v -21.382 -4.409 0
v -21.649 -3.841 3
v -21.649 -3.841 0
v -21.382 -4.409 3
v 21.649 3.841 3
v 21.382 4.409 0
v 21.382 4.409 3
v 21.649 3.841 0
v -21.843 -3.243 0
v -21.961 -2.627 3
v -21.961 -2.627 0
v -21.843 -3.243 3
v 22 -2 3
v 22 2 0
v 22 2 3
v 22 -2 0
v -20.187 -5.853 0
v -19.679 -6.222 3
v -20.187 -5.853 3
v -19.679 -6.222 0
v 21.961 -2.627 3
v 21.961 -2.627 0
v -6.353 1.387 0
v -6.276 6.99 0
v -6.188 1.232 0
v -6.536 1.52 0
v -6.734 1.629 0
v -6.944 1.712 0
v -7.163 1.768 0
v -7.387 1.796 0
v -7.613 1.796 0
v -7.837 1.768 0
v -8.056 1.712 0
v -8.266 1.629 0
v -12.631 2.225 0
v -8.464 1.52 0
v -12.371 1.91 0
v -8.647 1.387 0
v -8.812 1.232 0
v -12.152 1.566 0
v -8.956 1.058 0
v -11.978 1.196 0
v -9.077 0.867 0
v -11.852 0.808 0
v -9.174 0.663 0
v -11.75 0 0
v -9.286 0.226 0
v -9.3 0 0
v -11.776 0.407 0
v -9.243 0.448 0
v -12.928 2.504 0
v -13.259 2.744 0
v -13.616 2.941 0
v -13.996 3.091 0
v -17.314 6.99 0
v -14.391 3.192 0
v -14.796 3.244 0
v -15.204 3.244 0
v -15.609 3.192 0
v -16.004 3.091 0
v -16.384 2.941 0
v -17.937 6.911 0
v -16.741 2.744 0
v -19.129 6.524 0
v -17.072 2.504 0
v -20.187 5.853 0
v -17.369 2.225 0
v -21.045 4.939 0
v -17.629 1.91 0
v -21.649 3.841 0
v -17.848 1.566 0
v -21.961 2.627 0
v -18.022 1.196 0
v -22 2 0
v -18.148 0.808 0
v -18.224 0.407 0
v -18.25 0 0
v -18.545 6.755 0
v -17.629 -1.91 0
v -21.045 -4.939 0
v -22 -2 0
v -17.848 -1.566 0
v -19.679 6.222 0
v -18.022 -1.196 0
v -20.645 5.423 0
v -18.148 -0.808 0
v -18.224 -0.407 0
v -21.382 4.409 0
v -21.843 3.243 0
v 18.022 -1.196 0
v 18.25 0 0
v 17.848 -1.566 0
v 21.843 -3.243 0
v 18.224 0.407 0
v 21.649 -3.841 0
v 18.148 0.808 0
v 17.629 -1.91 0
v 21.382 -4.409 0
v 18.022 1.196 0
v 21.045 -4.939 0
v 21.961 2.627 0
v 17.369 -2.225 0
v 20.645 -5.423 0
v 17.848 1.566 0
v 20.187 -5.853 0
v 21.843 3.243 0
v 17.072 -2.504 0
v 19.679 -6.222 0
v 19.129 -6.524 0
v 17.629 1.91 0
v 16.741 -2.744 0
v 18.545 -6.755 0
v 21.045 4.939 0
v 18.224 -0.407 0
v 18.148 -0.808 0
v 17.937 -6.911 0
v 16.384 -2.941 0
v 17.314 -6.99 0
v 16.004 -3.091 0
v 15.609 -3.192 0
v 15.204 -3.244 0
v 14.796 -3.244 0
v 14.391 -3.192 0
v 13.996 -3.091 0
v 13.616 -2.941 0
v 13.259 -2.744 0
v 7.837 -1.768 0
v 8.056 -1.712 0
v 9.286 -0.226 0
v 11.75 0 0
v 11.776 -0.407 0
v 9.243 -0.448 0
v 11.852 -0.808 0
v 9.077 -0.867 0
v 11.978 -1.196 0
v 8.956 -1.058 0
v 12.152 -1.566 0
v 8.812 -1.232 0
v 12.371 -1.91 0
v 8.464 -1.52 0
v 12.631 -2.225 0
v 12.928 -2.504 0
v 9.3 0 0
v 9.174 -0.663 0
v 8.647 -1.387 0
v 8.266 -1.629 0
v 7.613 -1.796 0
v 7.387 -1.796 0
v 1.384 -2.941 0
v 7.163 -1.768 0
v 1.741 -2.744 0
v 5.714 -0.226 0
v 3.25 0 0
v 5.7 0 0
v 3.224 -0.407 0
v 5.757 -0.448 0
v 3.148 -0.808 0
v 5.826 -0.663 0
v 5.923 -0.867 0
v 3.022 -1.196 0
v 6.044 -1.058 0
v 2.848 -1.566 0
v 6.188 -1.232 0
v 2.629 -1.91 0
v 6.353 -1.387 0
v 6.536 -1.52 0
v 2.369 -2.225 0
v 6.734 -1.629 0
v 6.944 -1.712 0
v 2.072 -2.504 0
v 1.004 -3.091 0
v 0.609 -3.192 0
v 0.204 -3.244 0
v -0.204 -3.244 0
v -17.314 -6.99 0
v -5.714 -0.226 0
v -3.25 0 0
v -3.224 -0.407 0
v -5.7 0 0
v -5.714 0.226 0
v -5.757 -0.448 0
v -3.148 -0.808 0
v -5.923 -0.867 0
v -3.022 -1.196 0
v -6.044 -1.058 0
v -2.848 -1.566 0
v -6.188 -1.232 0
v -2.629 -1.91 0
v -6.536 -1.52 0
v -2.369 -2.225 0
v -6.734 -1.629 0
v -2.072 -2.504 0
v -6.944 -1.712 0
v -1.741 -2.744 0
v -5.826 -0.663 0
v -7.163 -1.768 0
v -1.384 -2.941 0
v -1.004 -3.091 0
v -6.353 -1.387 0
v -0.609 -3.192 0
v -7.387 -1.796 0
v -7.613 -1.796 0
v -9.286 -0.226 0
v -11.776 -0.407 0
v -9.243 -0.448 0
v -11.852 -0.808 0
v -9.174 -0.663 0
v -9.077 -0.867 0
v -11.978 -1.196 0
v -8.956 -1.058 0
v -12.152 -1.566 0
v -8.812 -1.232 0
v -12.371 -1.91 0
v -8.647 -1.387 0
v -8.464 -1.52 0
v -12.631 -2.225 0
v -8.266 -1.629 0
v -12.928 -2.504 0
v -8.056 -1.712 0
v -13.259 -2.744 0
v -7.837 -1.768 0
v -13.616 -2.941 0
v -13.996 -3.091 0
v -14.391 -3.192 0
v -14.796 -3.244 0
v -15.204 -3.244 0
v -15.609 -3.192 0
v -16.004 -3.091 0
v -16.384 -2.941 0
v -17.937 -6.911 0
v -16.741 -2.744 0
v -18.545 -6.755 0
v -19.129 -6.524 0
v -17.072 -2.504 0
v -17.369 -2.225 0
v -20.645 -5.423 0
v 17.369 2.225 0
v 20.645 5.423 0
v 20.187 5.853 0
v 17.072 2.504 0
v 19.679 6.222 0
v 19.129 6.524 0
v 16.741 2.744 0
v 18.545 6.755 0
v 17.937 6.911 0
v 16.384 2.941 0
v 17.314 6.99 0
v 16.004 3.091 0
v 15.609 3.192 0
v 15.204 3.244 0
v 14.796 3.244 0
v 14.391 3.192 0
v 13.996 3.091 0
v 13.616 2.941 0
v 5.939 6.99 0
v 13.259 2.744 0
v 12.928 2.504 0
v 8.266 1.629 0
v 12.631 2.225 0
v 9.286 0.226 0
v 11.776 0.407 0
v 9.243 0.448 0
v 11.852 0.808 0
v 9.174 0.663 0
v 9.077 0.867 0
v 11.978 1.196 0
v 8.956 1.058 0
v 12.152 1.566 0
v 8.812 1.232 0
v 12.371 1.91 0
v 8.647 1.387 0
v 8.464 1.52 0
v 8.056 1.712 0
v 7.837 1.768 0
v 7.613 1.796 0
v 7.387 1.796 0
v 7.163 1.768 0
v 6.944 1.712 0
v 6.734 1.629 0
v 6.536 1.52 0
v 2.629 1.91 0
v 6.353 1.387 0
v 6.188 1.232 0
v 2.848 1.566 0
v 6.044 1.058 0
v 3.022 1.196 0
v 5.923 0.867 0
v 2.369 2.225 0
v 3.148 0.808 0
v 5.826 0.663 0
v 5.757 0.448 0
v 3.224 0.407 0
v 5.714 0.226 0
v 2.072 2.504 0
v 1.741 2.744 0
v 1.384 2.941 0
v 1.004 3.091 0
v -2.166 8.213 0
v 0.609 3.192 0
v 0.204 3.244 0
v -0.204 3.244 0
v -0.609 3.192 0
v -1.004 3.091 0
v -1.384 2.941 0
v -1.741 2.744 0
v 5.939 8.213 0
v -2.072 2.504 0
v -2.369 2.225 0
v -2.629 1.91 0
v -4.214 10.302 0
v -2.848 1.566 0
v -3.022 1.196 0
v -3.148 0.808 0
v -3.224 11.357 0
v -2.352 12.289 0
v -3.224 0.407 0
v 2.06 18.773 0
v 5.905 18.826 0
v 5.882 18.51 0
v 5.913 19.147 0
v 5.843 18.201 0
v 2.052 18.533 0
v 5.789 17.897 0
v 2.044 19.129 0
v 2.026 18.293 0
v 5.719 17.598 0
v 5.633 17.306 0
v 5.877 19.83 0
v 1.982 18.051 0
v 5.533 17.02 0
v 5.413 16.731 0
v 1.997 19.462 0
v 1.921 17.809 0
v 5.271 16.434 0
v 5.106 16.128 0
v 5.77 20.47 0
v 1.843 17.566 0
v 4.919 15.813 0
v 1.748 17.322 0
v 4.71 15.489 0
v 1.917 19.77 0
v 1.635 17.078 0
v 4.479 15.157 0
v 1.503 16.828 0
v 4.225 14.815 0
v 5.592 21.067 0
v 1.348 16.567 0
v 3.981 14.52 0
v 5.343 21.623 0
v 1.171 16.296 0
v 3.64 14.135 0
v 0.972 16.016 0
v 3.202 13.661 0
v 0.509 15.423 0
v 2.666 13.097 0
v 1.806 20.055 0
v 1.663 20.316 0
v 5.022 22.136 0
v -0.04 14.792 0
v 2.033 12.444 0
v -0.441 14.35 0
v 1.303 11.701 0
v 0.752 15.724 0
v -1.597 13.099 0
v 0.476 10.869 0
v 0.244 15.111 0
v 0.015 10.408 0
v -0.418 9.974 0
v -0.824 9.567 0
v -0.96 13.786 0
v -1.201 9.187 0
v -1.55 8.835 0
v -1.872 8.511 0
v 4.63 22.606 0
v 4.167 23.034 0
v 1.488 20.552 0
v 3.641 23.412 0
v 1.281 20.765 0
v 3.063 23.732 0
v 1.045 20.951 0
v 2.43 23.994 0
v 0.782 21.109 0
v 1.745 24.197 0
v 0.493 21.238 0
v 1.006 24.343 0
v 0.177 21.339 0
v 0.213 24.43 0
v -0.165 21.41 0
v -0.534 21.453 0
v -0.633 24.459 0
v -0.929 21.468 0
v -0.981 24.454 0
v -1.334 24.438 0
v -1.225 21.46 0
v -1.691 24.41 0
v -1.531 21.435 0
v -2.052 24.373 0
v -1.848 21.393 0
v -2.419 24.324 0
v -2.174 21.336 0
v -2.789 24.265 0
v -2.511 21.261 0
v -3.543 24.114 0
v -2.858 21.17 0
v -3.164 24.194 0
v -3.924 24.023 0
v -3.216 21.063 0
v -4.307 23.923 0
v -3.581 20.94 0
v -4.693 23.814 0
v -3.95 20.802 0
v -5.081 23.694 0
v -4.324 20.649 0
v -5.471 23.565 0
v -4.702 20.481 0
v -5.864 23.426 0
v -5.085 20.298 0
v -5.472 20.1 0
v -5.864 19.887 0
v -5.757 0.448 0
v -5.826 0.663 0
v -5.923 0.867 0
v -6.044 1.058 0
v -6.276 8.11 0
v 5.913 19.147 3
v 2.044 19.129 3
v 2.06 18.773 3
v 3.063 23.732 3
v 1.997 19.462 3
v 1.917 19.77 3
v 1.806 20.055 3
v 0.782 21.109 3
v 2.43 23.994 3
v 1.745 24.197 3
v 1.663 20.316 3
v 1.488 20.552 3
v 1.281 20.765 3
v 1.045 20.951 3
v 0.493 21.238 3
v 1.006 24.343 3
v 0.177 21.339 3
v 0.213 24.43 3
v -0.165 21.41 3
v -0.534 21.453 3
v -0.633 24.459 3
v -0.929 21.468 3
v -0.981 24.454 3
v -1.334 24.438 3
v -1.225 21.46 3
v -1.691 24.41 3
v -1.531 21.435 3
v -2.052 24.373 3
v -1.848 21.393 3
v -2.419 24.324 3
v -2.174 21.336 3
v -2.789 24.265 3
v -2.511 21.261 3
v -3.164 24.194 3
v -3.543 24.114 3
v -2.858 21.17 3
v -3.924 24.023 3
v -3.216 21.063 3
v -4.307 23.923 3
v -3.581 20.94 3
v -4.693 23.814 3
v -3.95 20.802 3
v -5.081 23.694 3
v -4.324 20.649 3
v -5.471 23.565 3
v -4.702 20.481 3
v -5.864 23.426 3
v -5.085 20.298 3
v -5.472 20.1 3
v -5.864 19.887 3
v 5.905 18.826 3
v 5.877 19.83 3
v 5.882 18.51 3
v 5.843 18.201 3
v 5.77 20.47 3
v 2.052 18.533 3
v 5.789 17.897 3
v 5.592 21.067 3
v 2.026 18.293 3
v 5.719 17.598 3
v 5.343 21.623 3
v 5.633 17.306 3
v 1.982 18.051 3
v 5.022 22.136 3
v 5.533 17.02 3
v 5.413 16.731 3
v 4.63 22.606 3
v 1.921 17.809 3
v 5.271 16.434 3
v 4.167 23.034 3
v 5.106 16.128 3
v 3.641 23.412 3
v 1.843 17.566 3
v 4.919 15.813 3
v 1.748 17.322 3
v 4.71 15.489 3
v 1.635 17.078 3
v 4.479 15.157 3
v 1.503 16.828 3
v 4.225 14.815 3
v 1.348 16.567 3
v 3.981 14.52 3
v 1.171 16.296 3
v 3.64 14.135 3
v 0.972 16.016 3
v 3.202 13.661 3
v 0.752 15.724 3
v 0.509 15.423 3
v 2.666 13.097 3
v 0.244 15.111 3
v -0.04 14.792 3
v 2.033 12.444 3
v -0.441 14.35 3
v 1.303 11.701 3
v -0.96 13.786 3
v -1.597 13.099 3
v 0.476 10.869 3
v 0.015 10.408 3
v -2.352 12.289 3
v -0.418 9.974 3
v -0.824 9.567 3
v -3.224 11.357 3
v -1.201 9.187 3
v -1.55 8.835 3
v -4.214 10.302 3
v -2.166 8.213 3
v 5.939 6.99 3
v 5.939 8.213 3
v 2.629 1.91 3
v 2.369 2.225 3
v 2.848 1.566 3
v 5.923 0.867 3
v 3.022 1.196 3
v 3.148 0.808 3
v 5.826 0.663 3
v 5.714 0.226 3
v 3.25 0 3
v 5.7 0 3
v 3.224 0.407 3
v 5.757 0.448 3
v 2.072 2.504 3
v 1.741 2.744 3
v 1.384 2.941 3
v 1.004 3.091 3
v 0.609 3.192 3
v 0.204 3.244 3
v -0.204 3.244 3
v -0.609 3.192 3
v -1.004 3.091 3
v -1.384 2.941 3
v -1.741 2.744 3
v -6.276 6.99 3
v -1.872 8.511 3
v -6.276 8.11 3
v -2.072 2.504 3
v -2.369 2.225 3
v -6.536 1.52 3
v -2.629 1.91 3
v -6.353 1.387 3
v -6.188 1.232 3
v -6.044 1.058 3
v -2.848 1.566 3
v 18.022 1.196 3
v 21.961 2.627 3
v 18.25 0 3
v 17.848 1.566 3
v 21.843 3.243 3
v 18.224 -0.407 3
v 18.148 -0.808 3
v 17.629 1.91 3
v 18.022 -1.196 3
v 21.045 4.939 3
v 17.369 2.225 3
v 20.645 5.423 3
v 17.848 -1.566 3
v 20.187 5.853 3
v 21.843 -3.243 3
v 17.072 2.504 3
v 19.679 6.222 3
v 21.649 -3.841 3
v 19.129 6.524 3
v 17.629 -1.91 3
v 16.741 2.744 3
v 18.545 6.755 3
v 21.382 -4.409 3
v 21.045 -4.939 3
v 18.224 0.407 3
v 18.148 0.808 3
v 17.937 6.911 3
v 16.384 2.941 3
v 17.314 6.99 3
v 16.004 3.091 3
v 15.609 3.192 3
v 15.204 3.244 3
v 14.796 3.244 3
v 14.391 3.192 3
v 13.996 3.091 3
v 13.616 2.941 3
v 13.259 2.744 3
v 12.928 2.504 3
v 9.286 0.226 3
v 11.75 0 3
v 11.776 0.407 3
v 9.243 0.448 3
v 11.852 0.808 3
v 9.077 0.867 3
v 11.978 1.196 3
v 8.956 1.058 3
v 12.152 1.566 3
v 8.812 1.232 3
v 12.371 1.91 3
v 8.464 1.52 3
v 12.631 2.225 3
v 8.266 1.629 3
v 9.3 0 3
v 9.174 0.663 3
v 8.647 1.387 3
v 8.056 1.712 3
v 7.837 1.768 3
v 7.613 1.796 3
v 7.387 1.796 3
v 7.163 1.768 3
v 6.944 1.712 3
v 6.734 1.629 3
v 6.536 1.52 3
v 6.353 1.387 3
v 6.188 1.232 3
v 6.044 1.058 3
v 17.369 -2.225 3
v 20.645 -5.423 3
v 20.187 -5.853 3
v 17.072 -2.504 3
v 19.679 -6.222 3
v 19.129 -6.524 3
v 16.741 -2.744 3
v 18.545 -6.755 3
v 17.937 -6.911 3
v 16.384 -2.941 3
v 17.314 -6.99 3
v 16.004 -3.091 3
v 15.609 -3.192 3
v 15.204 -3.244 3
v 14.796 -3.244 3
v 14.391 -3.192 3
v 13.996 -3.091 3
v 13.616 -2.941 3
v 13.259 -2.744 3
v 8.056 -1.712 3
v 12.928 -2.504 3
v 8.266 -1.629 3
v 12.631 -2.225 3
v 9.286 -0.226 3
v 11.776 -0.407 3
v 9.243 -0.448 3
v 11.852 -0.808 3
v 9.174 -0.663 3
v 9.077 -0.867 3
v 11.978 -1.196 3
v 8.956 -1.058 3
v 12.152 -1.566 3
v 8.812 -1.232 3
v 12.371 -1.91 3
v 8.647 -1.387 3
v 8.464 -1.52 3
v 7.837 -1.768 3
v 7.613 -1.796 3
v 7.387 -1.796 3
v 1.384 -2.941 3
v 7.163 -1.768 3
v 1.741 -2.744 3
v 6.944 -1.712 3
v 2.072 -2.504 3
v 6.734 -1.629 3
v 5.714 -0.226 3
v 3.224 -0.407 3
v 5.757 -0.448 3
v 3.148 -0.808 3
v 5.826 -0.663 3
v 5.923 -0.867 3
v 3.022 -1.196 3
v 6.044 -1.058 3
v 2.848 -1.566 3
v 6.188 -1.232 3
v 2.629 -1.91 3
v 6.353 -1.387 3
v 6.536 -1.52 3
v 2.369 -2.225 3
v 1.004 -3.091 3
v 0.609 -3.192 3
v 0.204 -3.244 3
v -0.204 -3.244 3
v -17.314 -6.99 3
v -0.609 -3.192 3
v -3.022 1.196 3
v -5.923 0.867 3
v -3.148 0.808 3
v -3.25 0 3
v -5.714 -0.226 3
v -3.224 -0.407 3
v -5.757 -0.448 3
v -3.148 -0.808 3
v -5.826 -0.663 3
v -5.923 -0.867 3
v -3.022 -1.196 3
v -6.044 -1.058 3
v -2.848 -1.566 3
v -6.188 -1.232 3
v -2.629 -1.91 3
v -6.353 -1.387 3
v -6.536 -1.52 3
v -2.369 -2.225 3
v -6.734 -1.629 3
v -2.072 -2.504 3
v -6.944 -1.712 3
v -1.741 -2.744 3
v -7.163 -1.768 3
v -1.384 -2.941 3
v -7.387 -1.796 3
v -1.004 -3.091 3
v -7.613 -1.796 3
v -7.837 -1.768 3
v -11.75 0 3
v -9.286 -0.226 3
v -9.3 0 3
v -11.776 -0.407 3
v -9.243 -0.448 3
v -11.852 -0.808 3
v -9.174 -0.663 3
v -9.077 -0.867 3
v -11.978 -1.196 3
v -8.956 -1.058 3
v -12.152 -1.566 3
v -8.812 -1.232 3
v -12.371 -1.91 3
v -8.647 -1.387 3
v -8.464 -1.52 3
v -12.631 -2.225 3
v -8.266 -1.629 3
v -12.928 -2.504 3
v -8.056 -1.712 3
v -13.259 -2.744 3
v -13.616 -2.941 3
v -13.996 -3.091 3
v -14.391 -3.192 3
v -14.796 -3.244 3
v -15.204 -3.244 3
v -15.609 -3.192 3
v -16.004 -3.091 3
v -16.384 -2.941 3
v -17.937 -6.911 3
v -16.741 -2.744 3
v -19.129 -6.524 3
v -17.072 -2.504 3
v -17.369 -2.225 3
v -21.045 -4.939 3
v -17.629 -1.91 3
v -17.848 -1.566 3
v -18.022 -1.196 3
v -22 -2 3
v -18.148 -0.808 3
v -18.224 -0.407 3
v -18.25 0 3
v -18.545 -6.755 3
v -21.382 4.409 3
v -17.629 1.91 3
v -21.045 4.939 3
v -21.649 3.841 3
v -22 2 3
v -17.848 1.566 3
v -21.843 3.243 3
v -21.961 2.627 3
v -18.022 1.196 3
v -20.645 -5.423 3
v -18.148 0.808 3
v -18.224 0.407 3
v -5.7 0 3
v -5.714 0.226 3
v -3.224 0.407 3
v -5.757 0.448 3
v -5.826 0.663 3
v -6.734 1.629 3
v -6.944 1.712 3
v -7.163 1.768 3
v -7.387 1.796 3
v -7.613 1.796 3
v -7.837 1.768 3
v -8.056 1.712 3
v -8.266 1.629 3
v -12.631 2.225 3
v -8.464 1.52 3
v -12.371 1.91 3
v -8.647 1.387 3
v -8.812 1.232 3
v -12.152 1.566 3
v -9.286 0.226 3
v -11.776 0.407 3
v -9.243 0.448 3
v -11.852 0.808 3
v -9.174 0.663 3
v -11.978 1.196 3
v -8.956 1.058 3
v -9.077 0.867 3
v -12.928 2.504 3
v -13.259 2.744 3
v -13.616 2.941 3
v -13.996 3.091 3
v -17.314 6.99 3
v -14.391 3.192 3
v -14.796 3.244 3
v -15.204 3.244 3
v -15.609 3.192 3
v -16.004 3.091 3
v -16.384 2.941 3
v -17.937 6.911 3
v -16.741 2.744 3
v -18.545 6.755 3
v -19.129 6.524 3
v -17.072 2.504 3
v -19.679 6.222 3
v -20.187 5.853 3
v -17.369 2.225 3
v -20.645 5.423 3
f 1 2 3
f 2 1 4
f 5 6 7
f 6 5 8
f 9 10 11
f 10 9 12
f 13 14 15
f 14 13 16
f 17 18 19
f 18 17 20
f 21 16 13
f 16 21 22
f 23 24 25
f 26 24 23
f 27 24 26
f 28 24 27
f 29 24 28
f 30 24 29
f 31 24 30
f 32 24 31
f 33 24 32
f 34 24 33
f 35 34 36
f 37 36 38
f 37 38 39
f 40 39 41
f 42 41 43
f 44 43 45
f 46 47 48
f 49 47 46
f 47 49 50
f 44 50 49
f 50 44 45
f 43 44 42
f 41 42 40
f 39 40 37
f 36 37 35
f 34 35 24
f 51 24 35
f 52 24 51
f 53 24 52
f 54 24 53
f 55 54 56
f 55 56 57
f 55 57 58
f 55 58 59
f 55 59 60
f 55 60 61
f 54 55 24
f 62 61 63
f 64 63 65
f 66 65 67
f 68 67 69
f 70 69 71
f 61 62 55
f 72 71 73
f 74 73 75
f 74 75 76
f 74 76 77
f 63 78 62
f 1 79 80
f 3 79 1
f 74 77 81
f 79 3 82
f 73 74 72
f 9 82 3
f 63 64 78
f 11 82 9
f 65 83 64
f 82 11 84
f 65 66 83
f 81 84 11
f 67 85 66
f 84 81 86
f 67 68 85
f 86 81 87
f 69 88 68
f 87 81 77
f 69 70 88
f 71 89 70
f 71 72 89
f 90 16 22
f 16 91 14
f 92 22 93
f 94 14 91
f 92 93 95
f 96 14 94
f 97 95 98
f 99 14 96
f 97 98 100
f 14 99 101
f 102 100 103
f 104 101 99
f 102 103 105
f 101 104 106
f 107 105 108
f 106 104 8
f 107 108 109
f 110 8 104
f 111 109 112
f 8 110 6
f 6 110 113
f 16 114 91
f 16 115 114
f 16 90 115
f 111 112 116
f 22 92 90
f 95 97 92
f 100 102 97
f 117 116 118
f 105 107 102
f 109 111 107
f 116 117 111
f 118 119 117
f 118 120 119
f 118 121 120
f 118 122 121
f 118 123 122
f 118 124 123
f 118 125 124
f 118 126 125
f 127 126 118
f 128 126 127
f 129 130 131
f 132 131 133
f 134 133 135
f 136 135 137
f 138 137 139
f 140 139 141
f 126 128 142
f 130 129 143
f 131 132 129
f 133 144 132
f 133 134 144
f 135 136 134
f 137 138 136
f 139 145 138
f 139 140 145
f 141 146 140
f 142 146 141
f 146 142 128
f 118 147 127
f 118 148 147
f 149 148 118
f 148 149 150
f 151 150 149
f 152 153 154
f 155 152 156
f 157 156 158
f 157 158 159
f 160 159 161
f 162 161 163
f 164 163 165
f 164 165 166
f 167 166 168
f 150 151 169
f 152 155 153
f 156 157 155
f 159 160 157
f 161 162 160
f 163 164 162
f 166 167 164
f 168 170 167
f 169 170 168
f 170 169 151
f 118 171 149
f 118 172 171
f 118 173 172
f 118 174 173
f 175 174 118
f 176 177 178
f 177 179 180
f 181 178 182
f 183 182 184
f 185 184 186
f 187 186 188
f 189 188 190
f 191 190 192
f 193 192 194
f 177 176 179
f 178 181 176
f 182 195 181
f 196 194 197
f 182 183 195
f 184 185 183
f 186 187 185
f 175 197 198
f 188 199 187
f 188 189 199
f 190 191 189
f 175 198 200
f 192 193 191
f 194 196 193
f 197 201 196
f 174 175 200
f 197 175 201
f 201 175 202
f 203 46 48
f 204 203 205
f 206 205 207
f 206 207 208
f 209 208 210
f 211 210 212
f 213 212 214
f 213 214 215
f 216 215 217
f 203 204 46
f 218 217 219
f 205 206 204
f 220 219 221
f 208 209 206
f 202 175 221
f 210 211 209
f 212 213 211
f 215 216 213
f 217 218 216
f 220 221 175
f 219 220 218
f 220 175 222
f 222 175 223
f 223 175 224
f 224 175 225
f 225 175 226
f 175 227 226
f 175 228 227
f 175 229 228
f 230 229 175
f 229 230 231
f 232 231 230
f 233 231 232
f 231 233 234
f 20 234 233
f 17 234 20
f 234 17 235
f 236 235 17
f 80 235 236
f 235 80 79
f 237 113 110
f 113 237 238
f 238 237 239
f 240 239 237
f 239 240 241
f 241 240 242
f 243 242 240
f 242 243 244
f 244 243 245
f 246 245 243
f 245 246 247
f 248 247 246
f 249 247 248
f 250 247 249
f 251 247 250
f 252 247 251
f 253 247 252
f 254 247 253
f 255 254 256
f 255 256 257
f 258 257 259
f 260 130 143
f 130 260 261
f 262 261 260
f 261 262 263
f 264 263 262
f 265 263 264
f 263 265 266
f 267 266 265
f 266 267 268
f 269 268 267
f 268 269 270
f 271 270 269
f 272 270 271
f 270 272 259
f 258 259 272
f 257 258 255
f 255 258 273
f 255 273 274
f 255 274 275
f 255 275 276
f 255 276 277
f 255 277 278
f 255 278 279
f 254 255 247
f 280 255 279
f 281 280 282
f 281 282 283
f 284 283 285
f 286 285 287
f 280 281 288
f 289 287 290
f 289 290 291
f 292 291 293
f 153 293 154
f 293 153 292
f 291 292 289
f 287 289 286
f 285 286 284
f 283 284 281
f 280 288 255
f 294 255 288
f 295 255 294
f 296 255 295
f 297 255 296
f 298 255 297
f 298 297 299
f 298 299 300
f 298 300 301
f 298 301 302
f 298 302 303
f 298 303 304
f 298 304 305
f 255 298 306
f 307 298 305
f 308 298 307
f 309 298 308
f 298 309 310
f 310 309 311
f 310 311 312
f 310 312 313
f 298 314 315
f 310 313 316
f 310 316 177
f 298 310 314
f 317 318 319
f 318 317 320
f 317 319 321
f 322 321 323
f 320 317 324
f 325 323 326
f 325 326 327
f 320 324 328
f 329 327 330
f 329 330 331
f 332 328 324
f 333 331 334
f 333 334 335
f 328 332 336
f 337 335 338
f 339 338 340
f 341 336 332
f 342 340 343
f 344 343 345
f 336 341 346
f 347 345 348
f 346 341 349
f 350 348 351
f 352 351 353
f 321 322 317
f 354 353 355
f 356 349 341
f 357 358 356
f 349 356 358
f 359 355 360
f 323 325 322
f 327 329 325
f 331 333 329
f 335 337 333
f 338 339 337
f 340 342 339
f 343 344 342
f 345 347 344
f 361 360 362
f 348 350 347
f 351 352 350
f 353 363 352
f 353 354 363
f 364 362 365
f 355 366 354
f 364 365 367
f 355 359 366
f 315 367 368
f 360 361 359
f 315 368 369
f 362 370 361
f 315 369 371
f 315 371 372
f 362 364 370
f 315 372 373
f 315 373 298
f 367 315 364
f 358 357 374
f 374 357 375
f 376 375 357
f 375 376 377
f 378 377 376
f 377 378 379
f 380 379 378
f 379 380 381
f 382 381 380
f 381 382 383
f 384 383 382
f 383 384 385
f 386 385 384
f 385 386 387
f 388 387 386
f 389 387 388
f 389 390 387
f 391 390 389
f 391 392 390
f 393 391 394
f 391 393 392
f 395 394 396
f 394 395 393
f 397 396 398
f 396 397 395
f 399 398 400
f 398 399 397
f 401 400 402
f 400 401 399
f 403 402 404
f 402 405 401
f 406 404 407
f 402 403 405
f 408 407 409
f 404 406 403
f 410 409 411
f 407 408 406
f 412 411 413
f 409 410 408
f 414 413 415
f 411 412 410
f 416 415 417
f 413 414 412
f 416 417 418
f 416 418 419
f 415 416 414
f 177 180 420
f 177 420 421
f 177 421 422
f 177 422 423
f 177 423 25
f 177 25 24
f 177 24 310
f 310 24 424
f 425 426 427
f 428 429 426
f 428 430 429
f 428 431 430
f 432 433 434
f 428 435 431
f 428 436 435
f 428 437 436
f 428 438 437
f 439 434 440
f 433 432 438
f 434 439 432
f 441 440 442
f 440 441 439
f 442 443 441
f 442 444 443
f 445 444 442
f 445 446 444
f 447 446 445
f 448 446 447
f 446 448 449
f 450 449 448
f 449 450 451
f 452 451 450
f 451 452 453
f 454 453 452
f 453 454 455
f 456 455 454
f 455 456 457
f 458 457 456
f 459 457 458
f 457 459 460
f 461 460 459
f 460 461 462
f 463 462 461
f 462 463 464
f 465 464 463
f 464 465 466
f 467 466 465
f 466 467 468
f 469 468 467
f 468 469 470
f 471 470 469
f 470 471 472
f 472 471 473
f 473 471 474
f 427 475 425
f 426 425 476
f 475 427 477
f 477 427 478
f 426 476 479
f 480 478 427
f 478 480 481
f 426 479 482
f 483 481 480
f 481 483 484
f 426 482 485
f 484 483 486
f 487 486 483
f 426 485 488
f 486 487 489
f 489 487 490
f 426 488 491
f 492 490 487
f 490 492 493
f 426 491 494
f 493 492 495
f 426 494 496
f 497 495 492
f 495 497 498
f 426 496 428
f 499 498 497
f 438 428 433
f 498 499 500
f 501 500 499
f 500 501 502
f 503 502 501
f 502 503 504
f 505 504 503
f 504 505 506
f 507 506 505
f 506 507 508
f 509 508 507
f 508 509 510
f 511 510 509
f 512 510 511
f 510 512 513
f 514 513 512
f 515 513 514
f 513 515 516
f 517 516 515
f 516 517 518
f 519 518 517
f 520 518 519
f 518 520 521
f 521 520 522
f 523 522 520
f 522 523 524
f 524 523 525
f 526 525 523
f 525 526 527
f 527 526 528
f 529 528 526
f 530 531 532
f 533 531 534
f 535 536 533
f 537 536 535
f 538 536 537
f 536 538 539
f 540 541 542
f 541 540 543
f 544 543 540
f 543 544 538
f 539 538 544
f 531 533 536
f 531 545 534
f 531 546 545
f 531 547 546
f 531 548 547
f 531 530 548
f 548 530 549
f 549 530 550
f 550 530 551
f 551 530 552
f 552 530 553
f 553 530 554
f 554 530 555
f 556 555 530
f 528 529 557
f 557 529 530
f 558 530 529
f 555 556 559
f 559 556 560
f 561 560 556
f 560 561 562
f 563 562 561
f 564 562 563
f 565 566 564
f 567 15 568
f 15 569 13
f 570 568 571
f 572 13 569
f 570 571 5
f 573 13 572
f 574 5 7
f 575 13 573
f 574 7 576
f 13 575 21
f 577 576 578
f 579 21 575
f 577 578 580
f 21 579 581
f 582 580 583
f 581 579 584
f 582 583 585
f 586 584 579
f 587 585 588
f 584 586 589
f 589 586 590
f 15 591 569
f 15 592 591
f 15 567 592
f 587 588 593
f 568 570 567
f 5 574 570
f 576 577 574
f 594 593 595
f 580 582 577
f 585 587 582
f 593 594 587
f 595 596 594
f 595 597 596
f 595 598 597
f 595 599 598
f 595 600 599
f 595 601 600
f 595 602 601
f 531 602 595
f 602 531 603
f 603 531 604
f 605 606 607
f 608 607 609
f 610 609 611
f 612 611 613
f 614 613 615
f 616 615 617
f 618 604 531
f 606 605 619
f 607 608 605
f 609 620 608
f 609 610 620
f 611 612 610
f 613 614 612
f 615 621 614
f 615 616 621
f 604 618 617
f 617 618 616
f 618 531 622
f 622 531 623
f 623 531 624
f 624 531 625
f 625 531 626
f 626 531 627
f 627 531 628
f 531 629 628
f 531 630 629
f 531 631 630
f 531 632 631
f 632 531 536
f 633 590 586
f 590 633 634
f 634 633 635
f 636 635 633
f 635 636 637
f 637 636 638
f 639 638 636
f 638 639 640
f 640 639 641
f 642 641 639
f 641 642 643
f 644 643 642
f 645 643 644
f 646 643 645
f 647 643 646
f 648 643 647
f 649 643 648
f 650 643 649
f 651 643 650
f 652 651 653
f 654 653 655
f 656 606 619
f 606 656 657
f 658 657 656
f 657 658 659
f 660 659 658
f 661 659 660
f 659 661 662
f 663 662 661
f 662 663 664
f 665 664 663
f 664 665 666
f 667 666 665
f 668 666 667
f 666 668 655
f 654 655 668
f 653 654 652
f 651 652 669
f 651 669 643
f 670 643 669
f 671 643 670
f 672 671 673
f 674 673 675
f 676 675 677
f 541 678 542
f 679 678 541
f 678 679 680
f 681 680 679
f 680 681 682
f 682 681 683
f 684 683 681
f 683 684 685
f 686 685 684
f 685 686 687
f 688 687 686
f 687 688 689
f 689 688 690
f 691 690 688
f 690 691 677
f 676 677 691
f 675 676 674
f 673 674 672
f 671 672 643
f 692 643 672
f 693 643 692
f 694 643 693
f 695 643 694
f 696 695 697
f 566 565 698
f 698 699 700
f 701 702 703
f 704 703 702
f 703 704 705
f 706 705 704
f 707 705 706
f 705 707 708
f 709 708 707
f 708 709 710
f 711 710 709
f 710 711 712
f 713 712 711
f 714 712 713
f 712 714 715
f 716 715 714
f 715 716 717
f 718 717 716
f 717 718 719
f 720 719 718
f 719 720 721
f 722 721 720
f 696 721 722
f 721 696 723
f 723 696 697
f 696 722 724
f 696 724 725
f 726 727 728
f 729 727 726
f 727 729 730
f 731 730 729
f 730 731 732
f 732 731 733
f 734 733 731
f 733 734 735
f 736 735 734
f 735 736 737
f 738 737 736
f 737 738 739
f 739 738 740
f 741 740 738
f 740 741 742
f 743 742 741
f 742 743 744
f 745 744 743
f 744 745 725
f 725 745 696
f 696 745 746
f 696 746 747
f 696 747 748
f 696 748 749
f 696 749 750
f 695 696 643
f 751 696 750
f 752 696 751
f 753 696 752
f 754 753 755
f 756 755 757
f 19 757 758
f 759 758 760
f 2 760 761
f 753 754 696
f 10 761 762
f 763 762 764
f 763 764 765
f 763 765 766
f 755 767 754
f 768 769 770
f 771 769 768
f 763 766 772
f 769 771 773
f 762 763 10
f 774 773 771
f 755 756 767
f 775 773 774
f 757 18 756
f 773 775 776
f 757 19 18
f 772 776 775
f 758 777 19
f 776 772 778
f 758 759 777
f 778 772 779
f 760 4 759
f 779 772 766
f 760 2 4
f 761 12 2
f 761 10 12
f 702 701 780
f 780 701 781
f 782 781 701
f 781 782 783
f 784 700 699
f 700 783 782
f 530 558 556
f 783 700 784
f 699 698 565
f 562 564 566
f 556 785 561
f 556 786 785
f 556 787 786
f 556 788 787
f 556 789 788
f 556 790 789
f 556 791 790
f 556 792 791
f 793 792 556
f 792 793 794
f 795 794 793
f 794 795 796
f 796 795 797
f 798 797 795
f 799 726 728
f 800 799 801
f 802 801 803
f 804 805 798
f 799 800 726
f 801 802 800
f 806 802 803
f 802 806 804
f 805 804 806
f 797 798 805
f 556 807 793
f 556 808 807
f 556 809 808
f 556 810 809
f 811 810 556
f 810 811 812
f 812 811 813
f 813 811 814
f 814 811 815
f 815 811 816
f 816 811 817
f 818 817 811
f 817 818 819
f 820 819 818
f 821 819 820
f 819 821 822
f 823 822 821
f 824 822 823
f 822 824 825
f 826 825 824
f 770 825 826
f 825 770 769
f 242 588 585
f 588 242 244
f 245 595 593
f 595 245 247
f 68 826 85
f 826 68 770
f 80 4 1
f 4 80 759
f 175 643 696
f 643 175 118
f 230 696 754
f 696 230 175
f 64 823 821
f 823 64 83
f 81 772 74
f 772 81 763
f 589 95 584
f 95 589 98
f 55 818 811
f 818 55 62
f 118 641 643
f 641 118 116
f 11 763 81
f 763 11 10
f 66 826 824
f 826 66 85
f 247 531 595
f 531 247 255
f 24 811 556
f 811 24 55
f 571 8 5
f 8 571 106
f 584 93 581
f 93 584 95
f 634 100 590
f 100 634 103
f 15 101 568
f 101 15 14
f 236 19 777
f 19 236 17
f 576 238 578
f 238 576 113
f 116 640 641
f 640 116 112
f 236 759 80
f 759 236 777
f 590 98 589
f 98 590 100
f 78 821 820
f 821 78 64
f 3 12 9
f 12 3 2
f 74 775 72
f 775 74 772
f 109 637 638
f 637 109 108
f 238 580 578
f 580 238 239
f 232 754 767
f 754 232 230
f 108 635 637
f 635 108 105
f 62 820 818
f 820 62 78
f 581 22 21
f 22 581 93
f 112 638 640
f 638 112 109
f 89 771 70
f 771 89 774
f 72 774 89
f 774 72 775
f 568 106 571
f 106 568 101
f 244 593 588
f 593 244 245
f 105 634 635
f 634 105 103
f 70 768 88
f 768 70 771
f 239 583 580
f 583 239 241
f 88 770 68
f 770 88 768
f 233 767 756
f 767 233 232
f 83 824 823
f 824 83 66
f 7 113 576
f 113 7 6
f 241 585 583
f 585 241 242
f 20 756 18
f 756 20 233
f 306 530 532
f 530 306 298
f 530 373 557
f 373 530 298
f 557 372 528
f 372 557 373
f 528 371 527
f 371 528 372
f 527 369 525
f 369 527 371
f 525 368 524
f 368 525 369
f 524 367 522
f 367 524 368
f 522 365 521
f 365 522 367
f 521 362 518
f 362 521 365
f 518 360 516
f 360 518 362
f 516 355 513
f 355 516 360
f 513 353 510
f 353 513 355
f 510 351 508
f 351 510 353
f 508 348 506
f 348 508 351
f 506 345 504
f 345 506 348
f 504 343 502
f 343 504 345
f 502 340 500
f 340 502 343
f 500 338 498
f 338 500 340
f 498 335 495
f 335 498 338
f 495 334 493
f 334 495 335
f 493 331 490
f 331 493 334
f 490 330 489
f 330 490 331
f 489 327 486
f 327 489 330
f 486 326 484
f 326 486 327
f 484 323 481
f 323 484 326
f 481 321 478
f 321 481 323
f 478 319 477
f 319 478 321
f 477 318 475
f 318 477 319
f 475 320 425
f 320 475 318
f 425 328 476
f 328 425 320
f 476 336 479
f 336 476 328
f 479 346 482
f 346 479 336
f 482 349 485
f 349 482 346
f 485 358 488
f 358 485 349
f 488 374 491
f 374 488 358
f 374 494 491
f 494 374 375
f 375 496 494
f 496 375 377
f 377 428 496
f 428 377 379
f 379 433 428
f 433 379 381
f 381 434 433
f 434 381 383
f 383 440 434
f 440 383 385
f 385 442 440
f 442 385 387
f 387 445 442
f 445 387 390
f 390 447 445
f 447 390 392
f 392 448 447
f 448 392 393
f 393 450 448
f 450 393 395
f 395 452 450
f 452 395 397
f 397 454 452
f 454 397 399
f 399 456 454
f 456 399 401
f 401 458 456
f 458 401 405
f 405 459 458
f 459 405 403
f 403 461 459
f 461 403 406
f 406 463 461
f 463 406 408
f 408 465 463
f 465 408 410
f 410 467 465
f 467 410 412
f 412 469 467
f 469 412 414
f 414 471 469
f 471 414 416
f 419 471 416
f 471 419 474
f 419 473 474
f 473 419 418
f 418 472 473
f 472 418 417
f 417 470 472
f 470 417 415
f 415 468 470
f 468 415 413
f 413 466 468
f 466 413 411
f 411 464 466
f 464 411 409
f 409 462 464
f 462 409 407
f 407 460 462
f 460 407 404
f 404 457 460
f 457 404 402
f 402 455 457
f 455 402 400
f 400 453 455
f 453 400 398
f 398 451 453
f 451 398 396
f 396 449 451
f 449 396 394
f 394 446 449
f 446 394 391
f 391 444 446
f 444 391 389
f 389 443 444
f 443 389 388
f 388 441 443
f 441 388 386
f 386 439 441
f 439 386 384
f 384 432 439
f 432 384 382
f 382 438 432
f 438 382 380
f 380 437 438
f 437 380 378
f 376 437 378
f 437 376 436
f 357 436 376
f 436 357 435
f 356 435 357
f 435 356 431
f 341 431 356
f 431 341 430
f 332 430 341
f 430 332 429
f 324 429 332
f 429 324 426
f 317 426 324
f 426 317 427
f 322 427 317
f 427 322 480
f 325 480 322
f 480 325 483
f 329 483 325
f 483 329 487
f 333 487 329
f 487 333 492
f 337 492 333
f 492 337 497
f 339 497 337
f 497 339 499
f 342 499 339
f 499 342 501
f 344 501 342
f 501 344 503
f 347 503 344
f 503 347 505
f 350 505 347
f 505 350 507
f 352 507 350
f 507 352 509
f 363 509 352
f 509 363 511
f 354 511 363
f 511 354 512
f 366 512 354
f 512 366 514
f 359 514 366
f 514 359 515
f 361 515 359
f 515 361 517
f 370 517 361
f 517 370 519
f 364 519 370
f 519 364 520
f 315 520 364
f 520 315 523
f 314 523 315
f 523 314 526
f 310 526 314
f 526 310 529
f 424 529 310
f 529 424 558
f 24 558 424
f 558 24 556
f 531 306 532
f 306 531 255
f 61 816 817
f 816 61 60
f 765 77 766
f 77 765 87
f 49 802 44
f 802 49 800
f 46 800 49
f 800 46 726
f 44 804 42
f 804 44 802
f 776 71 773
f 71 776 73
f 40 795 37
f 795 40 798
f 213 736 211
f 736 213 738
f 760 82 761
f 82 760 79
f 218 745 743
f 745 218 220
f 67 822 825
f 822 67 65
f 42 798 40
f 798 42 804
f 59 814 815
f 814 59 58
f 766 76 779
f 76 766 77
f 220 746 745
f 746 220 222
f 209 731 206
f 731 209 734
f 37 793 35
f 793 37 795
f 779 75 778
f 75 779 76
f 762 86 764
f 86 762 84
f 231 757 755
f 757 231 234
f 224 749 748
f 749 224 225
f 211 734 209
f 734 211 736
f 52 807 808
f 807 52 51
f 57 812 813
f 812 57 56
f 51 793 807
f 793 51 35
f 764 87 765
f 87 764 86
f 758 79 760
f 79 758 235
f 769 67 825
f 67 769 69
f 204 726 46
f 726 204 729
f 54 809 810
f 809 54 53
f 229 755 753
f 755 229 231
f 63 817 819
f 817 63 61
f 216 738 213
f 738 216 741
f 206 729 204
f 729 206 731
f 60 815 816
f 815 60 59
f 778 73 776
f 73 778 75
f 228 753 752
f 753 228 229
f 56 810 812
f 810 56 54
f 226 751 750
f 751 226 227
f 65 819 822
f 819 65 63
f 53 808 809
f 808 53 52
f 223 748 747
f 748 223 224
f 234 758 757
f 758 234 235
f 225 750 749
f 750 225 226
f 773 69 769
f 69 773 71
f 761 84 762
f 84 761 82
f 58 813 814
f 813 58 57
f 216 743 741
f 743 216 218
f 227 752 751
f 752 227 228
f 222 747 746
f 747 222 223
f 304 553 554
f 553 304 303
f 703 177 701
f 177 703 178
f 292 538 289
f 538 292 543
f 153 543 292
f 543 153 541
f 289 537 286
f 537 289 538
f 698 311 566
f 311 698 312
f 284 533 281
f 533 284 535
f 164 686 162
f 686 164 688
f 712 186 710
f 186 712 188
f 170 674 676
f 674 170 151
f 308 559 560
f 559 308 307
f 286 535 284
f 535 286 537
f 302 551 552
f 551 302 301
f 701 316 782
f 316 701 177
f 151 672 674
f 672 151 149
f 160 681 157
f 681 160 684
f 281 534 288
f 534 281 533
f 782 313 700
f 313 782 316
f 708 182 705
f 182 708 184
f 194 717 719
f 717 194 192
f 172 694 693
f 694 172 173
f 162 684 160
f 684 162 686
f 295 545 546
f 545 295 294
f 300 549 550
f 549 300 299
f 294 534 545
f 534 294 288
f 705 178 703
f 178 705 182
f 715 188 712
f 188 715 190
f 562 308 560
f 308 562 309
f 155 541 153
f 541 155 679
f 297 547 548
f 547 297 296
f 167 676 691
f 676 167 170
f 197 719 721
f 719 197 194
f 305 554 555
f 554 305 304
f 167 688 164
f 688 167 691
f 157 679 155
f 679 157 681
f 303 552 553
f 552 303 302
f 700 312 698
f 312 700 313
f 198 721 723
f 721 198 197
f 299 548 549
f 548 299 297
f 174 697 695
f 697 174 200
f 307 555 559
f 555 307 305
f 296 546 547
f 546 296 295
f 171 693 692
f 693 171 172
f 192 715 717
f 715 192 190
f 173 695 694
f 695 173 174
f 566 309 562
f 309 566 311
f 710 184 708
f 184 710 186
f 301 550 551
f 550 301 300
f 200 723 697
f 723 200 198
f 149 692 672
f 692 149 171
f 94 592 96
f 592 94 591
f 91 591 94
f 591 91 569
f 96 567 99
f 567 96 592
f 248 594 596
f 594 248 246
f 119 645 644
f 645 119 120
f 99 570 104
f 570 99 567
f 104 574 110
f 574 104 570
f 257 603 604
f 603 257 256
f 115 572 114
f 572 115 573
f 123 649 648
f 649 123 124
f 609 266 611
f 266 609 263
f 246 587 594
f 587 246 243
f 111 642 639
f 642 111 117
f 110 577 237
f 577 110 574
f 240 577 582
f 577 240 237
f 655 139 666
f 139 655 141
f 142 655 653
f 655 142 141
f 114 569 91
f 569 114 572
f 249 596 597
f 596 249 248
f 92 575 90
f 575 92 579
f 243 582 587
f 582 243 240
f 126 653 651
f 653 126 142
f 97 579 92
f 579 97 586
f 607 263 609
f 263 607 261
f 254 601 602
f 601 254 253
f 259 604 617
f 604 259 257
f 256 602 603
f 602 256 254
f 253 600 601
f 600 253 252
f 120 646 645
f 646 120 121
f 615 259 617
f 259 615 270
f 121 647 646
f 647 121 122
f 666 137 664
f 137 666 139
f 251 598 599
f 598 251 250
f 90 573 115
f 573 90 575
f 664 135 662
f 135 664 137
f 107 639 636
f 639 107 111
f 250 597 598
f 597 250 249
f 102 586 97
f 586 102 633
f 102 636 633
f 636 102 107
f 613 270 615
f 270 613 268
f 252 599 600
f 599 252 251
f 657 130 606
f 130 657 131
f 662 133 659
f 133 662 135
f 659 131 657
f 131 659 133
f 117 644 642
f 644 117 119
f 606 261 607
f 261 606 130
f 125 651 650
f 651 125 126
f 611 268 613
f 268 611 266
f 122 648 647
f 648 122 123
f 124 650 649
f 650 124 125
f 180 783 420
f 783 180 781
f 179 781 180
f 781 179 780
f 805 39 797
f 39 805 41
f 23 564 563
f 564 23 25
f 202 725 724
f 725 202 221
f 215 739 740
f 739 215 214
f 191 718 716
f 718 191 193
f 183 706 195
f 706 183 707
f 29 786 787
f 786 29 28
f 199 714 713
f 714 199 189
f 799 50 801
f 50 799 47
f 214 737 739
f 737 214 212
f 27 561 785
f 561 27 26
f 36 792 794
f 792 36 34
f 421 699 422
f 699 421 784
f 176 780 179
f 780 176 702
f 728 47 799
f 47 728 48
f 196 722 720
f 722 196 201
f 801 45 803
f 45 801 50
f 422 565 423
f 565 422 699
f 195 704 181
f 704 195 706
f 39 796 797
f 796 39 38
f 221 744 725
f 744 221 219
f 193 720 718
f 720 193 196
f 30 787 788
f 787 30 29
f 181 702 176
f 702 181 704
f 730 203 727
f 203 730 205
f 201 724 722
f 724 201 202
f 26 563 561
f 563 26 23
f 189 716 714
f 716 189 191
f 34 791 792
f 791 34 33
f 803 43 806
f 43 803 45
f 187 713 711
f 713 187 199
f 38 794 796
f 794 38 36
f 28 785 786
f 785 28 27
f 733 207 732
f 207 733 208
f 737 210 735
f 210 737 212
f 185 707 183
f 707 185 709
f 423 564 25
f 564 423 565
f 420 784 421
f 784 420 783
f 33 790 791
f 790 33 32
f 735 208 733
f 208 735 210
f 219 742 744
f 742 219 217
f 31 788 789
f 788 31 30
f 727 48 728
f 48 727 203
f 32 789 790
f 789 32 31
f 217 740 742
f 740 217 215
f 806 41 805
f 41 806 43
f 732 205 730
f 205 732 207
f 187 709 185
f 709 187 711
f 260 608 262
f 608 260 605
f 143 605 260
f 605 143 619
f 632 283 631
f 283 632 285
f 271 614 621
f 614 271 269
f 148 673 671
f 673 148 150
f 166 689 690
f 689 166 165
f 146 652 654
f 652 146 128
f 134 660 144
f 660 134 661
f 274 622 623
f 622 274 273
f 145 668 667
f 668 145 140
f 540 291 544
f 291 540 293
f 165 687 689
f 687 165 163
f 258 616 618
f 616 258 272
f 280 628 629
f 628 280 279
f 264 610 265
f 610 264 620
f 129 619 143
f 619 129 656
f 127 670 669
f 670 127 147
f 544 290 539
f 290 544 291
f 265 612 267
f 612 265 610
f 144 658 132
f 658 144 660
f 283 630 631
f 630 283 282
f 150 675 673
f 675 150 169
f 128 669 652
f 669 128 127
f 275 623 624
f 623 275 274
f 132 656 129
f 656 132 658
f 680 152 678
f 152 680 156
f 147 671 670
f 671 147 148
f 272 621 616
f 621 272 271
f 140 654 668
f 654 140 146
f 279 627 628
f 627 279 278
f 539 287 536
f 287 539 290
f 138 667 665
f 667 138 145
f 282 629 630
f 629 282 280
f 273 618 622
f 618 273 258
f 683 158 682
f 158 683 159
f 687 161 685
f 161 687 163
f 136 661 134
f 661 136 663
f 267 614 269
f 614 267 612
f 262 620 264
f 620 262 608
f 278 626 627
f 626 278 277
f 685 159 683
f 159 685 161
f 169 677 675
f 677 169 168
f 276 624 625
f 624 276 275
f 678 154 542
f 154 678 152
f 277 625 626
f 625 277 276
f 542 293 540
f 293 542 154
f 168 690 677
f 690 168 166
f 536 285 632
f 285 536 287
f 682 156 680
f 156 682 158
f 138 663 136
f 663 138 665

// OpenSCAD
$fn = 50;


difference() {
	union() {
		hull() {
			translate(v = [-17.0000000000, 2.0000000000, 0]) {
				cylinder(h = 3, r = 5);
			}
			translate(v = [17.0000000000, 2.0000000000, 0]) {
				cylinder(h = 3, r = 5);
			}
			translate(v = [-17.0000000000, -2.0000000000, 0]) {
				cylinder(h = 3, r = 5);
			}
			translate(v = [17.0000000000, -2.0000000000, 0]) {
				cylinder(h = 3, r = 5);
			}
		}
		translate(v = [0, 24, 0]) {
			linear_extrude(height = 3) {
				text(font = "DejaVu Sans Mono:style=Bold", halign = "center", size = 19.0000000000, text = "2", valign = "top");
			}
		}
	}
	union() {
		translate(v = [-15.0000000000, 0.0000000000, 0]) {
			translate(v = [0, 0, -100]) {
				cylinder(h = 200, r = 3.2500000000);
			}
		}
		translate(v = [0, 0, -100]) {
			cylinder(h = 200, r = 3.2500000000);
		}
		translate(v = [15.0000000000, 0.0000000000, 0]) {
			translate(v = [0, 0, -100]) {
				cylinder(h = 200, r = 3.2500000000);
			}
		}
		translate(v = [-15.0000000000, 0.0000000000, 0]) {
			translate(v = [0, 0, -100]) {
				cylinder(h = 200, r = 1.8000000000);
			}
		}
		translate(v = [-7.5000000000, 0.0000000000, 0]) {
			translate(v = [0, 0, -100]) {
				cylinder(h = 200, r = 1.8000000000);
			}
		}
		translate(v = [0, 0, -100]) {
			cylinder(h = 200, r = 1.8000000000);
		}
		translate(v = [7.5000000000, 0.0000000000, 0]) {
			translate(v = [0, 0, -100]) {
				cylinder(h = 200, r = 1.8000000000);
			}
		}
		translate(v = [15.0000000000, 0.0000000000, 0]) {
			translate(v = [0, 0, -100]) {
				cylinder(h = 200, r = 1.8000000000);
			}
		}
	}
}
